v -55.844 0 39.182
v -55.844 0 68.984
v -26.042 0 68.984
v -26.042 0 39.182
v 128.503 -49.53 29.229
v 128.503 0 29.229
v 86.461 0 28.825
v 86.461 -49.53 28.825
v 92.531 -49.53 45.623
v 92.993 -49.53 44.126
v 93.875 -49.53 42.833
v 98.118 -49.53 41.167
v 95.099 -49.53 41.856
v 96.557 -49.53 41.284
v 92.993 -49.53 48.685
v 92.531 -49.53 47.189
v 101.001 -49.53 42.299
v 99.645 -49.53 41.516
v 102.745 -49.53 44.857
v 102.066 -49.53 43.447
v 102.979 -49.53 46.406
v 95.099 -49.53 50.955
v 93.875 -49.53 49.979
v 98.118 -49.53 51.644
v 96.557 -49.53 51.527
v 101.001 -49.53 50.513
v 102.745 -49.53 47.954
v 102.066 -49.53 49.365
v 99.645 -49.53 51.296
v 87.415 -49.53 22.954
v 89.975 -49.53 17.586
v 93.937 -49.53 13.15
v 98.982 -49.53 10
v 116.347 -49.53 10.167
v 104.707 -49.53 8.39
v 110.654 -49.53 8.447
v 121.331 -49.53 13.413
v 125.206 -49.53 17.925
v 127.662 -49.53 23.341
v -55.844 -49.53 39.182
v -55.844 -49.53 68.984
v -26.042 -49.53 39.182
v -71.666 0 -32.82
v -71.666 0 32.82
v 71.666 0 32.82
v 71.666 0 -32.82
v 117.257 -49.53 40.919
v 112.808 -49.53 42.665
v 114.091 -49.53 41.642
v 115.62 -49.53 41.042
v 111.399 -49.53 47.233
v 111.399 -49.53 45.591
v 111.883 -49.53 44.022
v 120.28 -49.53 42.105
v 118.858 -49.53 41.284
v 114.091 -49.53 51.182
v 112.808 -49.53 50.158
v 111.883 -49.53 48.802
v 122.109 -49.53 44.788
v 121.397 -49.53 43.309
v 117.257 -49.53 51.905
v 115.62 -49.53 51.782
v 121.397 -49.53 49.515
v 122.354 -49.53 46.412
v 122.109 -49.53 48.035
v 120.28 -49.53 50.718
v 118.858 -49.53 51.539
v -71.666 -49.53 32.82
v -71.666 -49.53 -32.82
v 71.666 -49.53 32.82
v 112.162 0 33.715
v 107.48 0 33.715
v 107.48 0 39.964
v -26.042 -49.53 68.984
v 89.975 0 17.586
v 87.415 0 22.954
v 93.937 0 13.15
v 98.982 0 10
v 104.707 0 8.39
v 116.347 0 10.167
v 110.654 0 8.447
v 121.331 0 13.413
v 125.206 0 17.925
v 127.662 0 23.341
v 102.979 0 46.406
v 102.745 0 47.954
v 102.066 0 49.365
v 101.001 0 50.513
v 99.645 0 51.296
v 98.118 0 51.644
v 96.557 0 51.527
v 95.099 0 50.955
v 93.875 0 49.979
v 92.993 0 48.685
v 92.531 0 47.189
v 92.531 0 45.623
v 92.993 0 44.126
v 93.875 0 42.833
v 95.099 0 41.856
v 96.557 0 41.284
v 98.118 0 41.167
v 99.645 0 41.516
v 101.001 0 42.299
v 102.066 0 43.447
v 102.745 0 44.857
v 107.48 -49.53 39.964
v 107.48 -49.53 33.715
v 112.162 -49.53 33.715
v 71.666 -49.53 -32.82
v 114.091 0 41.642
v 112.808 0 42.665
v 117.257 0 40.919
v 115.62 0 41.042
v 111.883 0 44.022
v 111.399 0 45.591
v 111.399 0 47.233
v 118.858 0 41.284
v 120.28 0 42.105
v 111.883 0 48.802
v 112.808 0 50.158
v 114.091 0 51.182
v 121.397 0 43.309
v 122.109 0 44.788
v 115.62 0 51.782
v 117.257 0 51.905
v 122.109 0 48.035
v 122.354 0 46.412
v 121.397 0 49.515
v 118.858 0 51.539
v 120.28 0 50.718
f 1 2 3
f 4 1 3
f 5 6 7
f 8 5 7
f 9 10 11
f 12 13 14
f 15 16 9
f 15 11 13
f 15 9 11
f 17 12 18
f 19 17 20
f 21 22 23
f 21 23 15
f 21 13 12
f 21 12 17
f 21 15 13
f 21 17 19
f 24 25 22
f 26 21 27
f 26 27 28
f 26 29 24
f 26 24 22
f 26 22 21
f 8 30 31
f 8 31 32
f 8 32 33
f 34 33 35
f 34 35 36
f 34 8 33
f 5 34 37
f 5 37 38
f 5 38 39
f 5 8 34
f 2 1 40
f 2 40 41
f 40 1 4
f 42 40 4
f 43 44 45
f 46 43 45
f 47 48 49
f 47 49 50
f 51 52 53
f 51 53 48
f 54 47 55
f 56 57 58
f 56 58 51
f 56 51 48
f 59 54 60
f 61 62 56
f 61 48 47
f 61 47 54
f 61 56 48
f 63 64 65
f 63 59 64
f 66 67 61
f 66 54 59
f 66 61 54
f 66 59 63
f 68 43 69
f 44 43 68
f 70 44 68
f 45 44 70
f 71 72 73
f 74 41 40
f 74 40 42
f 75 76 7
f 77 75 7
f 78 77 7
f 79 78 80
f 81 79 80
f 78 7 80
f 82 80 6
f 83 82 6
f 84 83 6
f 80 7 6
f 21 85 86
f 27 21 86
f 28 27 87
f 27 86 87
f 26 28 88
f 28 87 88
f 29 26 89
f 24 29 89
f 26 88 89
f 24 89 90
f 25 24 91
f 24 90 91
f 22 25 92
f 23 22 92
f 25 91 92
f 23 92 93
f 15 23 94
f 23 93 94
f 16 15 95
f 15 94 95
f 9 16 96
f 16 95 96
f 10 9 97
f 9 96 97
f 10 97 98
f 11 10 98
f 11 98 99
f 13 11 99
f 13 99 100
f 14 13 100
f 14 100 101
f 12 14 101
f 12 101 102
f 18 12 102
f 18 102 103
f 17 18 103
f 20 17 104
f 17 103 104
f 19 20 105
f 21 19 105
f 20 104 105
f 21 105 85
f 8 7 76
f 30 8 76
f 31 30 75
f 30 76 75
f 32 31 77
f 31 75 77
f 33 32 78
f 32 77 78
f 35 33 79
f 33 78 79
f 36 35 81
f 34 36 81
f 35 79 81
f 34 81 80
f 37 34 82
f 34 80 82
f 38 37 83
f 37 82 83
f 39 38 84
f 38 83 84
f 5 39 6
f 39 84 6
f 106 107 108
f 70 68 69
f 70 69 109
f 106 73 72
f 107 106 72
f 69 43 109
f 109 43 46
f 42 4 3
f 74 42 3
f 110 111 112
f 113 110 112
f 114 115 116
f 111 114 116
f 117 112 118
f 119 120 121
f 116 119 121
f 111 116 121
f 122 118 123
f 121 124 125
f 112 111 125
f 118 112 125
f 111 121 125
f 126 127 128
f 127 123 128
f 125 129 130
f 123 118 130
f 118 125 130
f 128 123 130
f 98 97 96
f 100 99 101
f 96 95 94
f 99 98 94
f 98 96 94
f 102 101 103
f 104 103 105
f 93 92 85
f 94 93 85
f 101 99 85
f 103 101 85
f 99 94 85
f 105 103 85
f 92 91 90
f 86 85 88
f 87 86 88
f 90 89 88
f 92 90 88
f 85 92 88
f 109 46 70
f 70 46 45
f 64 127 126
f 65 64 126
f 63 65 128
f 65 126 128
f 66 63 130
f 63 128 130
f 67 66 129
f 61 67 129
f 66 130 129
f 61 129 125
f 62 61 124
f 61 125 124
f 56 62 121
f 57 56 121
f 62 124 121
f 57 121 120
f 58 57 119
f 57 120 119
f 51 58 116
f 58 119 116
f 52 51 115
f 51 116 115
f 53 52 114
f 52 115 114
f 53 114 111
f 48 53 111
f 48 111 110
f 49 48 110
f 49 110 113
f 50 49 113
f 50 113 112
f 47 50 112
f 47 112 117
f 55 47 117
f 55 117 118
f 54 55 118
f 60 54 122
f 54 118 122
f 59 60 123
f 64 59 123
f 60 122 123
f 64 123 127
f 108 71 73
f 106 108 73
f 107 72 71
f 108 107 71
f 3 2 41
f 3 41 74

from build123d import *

# Parameters (mm, degrees)
F1_R     = 5.253022
F1_R_2   = 5.508223
F0_W     = 143.331006
F0_H     = 65.640218
F0_W_2   = 29.802561
F0_H_2   = 29.80256
F2_DEPTH = 49.53


with BuildPart() as f2:
    # F1 (on face) + F0 (on Front) → F2 (new body)
    with BuildSketch(Plane.XZ):
        with Locations((97.725712, 46.405662)):
            Circle(F1_R)
        with Locations((116.845511, 46.411794)):
            Circle(F1_R_2)
        Polygon((112.162083, 33.714831), (107.480191, 39.964292), (107.480191, 33.714831), align=None)
        with BuildLine():
            Line((128.503151, 29.229033), (86.461111, 28.824845))
            ThreePointArc((86.461111, 28.824845), (107.682294, 8.206797), (128.503151, 29.229033))
        make_face()
    with BuildSketch(Plane.XZ):
        Rectangle(F0_W, F0_H)
        with Locations((-40.94283, 54.083094)):
            Rectangle(F0_W_2, F0_H_2)
    extrude(amount=F2_DEPTH)


solid = f2.part
